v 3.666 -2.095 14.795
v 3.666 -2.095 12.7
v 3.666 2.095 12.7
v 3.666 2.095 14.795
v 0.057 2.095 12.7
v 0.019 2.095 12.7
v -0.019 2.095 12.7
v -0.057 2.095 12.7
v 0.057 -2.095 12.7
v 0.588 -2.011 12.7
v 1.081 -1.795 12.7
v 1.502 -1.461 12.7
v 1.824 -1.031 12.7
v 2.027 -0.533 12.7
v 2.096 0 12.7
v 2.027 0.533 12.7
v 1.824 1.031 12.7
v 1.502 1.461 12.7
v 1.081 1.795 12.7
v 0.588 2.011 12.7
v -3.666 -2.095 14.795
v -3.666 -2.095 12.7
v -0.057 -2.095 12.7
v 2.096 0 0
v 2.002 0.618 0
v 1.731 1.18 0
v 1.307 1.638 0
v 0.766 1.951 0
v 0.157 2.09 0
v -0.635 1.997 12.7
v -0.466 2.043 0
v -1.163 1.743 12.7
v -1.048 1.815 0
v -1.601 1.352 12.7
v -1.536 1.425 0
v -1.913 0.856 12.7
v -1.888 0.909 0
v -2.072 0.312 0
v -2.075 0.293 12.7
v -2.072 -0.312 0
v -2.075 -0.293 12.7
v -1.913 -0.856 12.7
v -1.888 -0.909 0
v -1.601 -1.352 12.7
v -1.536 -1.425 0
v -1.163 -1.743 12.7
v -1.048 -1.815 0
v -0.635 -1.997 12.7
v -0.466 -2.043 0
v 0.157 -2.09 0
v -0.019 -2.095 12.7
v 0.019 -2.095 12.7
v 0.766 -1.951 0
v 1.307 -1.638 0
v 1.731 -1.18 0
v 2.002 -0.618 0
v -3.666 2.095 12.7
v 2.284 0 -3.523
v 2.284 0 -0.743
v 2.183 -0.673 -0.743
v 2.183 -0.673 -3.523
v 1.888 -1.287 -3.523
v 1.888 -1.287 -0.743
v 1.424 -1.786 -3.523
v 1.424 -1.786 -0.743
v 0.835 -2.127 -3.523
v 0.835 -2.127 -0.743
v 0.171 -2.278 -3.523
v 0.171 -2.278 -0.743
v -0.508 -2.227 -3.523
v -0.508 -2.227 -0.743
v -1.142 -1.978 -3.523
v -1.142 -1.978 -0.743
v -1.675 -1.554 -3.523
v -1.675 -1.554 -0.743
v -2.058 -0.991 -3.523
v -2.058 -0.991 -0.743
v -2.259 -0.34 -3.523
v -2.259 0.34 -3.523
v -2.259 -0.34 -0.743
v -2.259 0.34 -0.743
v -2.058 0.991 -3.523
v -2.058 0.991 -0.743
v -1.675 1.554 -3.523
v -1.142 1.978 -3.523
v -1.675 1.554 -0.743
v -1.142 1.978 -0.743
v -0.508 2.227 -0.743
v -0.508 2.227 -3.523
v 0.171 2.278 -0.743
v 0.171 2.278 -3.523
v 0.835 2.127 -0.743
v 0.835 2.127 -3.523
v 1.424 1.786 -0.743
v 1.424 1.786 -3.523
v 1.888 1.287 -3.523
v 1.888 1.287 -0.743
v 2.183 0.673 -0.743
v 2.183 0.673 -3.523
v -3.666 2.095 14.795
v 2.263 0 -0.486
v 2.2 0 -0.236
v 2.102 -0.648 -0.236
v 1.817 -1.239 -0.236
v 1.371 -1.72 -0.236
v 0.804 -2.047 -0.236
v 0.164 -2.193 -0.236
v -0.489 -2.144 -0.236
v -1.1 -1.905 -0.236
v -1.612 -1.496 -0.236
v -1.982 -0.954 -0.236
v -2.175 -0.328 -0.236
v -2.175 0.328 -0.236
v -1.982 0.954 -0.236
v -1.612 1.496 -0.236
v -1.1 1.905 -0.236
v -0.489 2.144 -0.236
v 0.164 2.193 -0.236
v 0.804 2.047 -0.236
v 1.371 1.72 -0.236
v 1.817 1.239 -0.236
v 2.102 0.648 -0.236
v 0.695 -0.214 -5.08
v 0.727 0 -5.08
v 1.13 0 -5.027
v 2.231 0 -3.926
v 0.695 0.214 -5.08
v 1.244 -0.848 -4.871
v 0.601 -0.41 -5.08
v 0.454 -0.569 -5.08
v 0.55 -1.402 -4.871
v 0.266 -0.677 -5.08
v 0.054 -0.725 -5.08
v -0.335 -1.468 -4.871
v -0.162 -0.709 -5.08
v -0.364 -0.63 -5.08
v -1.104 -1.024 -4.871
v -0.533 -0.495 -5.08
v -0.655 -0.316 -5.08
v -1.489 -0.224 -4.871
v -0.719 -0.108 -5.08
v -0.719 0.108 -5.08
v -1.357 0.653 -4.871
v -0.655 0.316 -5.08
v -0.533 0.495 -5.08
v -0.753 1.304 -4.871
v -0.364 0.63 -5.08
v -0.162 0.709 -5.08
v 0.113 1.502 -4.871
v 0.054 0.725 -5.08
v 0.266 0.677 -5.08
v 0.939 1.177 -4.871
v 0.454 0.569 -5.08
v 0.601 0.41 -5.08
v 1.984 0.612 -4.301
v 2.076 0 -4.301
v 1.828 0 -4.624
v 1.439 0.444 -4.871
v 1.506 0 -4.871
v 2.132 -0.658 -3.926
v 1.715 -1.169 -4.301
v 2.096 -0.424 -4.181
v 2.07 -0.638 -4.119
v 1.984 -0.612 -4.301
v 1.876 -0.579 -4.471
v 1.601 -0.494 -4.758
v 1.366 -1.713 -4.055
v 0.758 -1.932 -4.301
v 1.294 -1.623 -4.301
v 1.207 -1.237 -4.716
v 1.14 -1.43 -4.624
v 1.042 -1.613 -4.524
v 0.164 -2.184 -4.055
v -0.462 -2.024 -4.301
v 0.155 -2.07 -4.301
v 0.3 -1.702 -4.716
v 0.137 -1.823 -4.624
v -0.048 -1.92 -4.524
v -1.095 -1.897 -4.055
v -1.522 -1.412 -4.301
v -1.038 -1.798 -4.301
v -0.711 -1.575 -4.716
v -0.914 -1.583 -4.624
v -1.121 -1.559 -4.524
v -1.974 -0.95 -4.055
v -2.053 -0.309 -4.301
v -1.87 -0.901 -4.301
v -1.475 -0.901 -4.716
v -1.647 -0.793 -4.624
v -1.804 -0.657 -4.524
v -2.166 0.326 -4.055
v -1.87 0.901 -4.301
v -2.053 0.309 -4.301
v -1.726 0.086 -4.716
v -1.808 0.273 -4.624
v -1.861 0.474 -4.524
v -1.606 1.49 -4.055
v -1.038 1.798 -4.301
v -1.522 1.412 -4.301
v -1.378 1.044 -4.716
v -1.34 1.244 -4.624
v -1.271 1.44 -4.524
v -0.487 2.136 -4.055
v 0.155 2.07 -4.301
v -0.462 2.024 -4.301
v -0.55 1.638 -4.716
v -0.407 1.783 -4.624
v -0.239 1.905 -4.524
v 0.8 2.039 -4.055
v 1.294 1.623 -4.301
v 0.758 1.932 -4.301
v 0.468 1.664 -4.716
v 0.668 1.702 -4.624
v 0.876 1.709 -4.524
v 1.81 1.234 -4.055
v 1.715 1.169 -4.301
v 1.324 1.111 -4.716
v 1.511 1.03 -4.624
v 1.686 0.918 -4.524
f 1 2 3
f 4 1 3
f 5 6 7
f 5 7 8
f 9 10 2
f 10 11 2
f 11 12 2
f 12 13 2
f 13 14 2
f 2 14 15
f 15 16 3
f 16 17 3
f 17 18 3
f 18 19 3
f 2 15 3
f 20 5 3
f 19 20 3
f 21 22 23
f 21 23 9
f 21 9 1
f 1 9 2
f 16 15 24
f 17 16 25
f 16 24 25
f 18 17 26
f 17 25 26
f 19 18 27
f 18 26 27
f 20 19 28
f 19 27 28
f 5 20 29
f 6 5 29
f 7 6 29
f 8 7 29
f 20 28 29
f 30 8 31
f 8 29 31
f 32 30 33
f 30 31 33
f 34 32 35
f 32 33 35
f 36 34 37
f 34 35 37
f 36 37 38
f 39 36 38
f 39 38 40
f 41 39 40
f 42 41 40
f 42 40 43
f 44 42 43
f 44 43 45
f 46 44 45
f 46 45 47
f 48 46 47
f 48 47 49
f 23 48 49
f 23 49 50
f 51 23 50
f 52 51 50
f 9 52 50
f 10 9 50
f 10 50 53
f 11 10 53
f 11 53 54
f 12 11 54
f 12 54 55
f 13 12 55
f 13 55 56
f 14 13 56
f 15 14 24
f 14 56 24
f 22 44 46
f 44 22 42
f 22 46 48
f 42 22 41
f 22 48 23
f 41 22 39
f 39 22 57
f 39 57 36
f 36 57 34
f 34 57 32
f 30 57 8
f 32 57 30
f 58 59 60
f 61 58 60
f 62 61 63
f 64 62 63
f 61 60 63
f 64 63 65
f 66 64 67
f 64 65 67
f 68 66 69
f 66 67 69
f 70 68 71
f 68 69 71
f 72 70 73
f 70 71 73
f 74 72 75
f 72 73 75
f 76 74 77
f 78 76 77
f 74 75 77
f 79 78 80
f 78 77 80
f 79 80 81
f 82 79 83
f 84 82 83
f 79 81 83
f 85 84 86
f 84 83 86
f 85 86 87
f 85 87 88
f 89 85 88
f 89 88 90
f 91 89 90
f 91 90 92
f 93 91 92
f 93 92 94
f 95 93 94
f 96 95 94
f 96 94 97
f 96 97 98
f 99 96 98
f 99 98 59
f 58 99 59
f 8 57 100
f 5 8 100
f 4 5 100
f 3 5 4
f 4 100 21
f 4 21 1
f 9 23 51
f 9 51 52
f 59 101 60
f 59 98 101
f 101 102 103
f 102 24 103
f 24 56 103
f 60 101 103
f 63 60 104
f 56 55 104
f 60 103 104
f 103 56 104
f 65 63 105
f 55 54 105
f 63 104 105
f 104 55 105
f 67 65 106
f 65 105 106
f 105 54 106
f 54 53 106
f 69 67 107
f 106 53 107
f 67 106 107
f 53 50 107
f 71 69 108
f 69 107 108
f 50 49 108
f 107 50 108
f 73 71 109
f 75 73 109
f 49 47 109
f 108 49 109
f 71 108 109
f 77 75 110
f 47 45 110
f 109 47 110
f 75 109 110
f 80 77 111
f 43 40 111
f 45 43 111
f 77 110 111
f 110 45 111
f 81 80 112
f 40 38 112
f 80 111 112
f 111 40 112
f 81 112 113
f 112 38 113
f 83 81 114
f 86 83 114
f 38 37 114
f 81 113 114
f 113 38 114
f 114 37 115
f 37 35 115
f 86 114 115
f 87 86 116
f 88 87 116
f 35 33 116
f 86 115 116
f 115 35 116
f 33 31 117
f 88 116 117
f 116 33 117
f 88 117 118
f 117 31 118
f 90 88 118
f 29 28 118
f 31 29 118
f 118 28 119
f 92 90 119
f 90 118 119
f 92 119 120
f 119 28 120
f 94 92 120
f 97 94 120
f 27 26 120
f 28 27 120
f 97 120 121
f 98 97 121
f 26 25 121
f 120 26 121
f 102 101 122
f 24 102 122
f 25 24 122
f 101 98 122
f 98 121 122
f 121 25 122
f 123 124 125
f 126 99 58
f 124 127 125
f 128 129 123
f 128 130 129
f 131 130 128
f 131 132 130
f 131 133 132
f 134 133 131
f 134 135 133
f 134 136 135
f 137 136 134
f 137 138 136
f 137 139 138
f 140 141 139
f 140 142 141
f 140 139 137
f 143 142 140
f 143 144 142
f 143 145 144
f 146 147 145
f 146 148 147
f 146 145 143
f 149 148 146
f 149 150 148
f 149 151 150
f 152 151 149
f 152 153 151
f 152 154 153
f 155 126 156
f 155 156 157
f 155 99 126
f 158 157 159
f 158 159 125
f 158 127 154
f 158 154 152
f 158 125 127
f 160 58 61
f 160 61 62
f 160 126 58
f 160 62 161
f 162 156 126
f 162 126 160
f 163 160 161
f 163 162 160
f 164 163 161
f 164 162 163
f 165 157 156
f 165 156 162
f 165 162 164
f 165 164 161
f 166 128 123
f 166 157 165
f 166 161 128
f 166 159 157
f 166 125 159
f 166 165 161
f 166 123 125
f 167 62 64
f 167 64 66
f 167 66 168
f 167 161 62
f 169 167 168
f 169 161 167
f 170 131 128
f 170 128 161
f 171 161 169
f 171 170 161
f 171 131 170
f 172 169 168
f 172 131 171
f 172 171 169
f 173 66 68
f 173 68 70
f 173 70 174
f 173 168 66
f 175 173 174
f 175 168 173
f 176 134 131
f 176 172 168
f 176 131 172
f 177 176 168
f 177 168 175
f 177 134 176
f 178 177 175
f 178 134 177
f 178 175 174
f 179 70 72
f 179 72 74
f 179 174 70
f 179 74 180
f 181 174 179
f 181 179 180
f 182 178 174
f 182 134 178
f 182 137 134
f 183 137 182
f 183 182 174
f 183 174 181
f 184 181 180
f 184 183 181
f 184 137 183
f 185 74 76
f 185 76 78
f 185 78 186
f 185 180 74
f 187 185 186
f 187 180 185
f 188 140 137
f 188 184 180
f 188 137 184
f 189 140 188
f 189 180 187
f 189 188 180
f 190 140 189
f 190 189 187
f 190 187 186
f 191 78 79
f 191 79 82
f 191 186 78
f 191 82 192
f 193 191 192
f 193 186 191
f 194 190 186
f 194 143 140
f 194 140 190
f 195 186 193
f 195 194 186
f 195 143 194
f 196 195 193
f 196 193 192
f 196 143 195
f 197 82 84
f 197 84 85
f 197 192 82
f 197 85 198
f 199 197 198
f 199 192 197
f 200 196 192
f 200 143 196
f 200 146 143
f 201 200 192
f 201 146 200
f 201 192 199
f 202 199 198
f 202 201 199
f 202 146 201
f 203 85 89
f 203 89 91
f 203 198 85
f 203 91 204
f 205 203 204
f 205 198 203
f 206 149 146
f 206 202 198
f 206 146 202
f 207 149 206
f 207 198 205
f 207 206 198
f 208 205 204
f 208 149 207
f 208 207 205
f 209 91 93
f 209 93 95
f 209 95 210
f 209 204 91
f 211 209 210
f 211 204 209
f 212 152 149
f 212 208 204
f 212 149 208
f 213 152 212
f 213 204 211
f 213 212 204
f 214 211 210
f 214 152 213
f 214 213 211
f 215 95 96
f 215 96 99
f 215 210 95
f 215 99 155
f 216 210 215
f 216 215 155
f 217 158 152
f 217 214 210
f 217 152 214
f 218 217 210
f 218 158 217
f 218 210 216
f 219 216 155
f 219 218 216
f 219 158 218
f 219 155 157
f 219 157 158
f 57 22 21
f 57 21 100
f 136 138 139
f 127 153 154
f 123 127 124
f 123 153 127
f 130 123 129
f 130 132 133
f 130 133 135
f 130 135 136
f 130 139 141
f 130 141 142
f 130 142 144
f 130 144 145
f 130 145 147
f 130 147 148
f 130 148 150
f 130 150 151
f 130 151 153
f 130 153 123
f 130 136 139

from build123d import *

# Parameters (mm, degrees)
F0_R     = 2.0955
F1_DEPTH = 12.7
F2_W     = 7.33298
F2_H     = 4.1894274764
F3_DEPTH = 2.0955
F4_R     = 2.284478014
F4_R_2   = 2.0955
F5_DEPTH = 5.08


# Not quite as in the source:
# - a fillet or chamfer that OpenCascade refuses, or shapes differently, is made with other operations: its cross-section is extruded or revolved along the edge and cut away or added


with BuildPart() as f1:
    # F0 (on Top) → F1 (new body)
    with BuildSketch(Plane.XY):
        Circle(F0_R)
    extrude(amount=F1_DEPTH)

    # F2 (on face) → F3 (join)
    with BuildSketch(Plane.XY.offset(12.7)):
        Rectangle(F2_W, F2_H)
    extrude(amount=F3_DEPTH)

    # F4 (on face) → F5 (join)
    with BuildSketch(Plane(origin=(0, 0, 0), x_dir=(1, 0, 0), z_dir=(0, 0, -1))):
        Circle(F4_R)
        Circle(F4_R_2, mode=Mode.SUBTRACT)
        Circle(F4_R_2)
    extrude(amount=F5_DEPTH)

    # F6: fillet of radius 1.5570711792 on 2 edges, made by hand

    # F6_s1 → F6_t2 (revolve, cut)
    with BuildSketch(Plane.XZ):
        with BuildLine():
            ThreePointArc((2.284478014, -0.7434996627), (2.2364941575, -0.3599294481), (2.0955, 0))
            Line((2.0955, 0), (2.284478014, 0))
            Line((2.284478014, 0), (2.284478014, -0.7434996627))
        make_face()
    revolve(axis=Axis((0, 0, 0), (0, 0, -1)), mode=Mode.SUBTRACT)

    # F6_s3 → F6_t4 (revolve, cut)
    with BuildSketch(Plane.XZ):
        with BuildLine():
            ThreePointArc((2.284478014, -3.5229288208), (1.8284224244, -4.6239444104), (0.7274068348, -5.08))
            Line((0.7274068348, -5.08), (2.284478014, -5.08))
            Line((2.284478014, -5.08), (2.284478014, -3.5229288208))
        make_face()
    revolve(axis=Axis((0, 0, -5.08), (0, 0, -1)), mode=Mode.SUBTRACT)


solid = f1.part
